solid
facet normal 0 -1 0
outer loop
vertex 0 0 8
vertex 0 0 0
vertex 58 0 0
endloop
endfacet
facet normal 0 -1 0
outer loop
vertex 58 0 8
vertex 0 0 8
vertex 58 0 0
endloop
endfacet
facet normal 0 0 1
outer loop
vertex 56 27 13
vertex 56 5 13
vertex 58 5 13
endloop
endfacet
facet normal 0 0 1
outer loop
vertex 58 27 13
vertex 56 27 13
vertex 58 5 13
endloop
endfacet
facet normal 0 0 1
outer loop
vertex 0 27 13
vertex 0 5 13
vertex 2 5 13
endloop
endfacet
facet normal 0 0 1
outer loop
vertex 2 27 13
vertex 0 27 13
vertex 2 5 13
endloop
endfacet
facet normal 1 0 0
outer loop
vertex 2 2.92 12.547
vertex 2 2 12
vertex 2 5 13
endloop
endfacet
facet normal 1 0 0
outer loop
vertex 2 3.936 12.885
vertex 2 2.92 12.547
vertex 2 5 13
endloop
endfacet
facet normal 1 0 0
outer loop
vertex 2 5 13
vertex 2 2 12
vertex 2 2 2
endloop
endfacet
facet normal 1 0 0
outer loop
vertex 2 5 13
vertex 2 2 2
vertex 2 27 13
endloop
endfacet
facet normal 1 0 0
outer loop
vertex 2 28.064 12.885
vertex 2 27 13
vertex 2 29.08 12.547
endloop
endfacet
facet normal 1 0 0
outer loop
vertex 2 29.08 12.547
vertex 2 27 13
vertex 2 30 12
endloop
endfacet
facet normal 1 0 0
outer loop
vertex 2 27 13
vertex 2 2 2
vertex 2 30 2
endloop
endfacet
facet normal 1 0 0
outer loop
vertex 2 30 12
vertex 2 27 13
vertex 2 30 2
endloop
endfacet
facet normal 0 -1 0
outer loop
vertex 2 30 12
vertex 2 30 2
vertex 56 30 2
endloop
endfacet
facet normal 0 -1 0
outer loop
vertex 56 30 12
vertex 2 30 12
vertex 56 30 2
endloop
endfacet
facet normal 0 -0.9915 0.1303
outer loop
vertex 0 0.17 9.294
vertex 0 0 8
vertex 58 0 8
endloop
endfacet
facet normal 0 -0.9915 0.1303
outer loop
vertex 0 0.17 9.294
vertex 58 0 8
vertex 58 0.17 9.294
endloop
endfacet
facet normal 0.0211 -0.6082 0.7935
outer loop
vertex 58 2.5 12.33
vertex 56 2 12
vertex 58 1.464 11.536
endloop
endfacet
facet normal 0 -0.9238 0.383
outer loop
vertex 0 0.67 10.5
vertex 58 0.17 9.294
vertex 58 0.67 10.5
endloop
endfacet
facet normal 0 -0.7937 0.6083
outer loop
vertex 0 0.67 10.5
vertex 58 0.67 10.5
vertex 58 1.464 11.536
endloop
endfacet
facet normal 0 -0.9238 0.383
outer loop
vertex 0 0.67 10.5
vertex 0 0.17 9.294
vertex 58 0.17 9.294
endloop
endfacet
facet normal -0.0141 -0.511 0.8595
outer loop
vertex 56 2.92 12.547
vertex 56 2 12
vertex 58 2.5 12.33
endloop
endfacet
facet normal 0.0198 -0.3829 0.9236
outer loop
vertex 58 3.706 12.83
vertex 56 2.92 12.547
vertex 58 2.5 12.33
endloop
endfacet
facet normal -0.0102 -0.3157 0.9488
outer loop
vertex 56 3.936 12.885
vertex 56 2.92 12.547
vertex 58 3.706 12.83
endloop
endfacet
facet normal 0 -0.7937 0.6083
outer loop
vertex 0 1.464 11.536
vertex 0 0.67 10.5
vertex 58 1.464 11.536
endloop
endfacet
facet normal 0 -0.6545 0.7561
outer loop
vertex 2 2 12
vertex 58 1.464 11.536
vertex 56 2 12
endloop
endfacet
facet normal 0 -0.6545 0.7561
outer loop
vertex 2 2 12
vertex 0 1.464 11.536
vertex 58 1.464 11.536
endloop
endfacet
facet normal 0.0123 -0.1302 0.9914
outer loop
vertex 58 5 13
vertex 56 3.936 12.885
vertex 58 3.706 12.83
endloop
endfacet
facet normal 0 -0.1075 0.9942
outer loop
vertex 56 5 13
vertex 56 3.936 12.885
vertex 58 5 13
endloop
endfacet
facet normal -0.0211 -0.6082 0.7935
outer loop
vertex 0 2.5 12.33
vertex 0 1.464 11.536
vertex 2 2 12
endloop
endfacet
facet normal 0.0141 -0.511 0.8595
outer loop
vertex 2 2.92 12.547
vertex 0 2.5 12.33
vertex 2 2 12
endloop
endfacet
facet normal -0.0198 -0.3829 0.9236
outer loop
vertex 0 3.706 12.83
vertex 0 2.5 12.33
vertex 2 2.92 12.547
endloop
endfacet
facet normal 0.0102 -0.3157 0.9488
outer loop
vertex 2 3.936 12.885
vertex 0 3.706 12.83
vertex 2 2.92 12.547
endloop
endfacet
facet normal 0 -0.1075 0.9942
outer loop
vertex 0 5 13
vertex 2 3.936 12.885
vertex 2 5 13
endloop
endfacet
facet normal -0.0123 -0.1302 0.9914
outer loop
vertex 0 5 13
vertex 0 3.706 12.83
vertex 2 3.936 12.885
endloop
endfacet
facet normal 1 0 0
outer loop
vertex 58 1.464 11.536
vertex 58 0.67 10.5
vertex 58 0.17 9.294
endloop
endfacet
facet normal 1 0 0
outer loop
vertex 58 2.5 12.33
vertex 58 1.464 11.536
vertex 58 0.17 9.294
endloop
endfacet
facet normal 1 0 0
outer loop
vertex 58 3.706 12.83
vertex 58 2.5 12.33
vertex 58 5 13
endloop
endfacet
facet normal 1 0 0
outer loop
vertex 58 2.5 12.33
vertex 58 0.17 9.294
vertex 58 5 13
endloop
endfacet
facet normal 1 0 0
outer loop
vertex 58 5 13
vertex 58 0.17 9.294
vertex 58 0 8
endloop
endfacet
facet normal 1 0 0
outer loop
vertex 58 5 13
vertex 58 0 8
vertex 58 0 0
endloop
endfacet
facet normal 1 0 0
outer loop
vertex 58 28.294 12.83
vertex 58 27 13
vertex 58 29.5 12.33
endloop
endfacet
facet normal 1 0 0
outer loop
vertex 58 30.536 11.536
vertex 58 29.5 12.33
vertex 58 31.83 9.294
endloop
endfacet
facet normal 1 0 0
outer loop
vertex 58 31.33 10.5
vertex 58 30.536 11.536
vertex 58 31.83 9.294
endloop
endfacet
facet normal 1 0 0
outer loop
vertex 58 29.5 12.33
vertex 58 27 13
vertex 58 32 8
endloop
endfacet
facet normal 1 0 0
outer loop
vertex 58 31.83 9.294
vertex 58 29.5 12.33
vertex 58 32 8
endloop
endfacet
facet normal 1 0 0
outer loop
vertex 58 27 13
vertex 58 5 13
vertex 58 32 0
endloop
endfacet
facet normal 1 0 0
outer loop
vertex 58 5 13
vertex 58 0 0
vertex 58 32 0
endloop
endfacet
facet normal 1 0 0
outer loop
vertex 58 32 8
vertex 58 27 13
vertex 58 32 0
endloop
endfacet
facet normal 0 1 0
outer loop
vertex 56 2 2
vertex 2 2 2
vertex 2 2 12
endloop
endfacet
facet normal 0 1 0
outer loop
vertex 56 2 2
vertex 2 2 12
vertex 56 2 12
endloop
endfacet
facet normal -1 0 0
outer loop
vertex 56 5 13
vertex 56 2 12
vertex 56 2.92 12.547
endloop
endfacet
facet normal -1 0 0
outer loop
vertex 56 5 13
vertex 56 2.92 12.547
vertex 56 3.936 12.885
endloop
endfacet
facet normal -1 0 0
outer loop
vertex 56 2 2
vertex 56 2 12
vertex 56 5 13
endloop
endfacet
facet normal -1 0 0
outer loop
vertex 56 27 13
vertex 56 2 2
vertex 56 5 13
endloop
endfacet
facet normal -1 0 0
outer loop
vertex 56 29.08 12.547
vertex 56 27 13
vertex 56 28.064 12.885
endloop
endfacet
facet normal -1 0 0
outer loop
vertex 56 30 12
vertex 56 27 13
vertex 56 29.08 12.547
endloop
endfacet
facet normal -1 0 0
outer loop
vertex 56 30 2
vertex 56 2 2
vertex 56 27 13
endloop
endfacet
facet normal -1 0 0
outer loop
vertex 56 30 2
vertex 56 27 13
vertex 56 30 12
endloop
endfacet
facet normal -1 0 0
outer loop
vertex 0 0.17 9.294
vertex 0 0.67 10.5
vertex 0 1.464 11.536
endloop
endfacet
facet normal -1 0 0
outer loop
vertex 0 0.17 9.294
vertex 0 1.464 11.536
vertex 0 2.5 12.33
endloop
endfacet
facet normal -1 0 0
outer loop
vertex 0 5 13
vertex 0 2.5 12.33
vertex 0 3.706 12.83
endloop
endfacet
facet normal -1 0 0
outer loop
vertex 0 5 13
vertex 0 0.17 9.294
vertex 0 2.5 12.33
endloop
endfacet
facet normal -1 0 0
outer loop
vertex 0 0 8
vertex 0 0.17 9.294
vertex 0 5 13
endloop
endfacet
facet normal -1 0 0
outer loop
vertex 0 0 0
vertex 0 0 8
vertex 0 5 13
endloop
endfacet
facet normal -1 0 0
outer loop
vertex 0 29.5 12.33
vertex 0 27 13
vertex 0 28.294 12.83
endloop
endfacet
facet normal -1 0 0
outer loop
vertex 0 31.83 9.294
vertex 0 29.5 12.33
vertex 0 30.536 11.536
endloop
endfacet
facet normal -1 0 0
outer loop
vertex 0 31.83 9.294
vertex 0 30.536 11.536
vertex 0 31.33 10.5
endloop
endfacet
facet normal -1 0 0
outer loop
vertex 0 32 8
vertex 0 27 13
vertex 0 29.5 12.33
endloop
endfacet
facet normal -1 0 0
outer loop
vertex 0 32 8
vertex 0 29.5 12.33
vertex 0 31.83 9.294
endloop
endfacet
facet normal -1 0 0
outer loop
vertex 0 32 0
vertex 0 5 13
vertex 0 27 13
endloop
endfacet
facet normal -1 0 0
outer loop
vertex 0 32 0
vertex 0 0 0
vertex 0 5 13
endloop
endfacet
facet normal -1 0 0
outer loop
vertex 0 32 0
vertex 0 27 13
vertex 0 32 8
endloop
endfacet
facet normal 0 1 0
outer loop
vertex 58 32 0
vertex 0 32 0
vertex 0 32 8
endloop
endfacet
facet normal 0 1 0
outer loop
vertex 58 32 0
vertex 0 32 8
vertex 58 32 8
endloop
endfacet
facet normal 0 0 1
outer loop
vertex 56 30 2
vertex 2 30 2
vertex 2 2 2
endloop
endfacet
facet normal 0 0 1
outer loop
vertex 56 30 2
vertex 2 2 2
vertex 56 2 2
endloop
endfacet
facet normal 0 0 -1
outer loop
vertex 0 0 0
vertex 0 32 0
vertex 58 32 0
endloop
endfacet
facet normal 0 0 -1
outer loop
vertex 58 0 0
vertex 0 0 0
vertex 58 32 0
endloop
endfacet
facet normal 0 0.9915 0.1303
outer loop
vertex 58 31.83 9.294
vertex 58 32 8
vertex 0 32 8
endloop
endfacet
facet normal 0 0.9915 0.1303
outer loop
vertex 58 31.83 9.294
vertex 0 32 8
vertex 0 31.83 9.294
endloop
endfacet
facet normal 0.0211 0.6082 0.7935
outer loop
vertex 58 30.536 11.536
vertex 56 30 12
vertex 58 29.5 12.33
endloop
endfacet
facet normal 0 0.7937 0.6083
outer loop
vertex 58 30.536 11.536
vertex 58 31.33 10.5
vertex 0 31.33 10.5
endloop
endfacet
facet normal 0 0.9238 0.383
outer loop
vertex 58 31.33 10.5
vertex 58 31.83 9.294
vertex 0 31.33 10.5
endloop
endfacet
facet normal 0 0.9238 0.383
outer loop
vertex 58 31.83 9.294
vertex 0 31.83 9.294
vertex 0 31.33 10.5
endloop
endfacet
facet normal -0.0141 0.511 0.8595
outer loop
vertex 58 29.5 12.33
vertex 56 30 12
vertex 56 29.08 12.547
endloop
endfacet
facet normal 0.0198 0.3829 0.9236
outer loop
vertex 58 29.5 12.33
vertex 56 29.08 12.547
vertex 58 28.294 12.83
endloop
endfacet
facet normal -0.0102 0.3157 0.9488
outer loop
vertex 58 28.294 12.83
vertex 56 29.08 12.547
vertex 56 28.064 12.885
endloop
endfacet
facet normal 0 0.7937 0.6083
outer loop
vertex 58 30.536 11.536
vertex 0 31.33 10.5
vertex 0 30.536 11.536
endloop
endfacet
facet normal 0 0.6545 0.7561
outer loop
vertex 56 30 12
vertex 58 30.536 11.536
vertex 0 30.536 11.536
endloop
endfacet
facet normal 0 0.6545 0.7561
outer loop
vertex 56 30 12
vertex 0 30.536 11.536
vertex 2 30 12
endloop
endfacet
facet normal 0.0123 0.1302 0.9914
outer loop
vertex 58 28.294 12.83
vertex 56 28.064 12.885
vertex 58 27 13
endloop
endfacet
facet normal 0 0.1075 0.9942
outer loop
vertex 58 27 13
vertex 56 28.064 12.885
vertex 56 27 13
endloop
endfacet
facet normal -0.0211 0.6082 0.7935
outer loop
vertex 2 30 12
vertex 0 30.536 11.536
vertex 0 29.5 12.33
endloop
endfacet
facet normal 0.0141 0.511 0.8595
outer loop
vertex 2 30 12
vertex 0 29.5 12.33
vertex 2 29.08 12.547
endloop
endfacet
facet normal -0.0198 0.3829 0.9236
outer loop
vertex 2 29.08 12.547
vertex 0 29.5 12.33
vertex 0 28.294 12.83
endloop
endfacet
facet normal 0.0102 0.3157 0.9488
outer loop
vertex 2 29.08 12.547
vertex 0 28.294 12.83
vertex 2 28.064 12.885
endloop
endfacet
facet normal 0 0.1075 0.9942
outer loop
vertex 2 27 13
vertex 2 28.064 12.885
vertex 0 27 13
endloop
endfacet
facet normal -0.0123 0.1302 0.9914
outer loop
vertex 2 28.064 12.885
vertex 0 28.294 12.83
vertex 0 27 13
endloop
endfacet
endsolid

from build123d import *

# Parameters (mm, degrees)
F0_W        = 58
F0_H        = 32
F1_DEPTH    = 13
F2_T        = -2
F3_T1_DEPTH = 83


# Not quite as in the source:
# - a fillet or chamfer that OpenCascade refuses, or shapes differently, is made with other operations: its cross-section is extruded or revolved along the edge and cut away or added


with BuildPart() as f1:
    # F0 (on Top) → F1 (new body)
    with BuildSketch(Plane.XY):
        with Locations((29, 16)):
            Rectangle(F0_W, F0_H)
    extrude(amount=F1_DEPTH)

    # F2
    f2_openings = [f1.faces().sort_by_distance(p)[0] for p in [
        (29, 16, 13),
    ]]
    offset(amount=F2_T, openings=f2_openings)

    # F3: fillet of radius 5 on 2 edges, made by hand

    # F3_s2 → F3_t1 (cut)
    with BuildSketch(Plane.YZ.offset(-12.5)):
        with BuildLine():
            ThreePointArc((0, 8), (1.4644660941, 11.5355339059), (5, 13))
            Line((5, 13), (0, 13))
            Line((0, 13), (0, 8))
        make_face()
        with BuildLine():
            ThreePointArc((32, 8), (30.5355339059, 11.5355339059), (27, 13))
            Line((27, 13), (32, 13))
            Line((32, 13), (32, 8))
        make_face()
    extrude(amount=F3_T1_DEPTH, mode=Mode.SUBTRACT)


solid = f1.part
